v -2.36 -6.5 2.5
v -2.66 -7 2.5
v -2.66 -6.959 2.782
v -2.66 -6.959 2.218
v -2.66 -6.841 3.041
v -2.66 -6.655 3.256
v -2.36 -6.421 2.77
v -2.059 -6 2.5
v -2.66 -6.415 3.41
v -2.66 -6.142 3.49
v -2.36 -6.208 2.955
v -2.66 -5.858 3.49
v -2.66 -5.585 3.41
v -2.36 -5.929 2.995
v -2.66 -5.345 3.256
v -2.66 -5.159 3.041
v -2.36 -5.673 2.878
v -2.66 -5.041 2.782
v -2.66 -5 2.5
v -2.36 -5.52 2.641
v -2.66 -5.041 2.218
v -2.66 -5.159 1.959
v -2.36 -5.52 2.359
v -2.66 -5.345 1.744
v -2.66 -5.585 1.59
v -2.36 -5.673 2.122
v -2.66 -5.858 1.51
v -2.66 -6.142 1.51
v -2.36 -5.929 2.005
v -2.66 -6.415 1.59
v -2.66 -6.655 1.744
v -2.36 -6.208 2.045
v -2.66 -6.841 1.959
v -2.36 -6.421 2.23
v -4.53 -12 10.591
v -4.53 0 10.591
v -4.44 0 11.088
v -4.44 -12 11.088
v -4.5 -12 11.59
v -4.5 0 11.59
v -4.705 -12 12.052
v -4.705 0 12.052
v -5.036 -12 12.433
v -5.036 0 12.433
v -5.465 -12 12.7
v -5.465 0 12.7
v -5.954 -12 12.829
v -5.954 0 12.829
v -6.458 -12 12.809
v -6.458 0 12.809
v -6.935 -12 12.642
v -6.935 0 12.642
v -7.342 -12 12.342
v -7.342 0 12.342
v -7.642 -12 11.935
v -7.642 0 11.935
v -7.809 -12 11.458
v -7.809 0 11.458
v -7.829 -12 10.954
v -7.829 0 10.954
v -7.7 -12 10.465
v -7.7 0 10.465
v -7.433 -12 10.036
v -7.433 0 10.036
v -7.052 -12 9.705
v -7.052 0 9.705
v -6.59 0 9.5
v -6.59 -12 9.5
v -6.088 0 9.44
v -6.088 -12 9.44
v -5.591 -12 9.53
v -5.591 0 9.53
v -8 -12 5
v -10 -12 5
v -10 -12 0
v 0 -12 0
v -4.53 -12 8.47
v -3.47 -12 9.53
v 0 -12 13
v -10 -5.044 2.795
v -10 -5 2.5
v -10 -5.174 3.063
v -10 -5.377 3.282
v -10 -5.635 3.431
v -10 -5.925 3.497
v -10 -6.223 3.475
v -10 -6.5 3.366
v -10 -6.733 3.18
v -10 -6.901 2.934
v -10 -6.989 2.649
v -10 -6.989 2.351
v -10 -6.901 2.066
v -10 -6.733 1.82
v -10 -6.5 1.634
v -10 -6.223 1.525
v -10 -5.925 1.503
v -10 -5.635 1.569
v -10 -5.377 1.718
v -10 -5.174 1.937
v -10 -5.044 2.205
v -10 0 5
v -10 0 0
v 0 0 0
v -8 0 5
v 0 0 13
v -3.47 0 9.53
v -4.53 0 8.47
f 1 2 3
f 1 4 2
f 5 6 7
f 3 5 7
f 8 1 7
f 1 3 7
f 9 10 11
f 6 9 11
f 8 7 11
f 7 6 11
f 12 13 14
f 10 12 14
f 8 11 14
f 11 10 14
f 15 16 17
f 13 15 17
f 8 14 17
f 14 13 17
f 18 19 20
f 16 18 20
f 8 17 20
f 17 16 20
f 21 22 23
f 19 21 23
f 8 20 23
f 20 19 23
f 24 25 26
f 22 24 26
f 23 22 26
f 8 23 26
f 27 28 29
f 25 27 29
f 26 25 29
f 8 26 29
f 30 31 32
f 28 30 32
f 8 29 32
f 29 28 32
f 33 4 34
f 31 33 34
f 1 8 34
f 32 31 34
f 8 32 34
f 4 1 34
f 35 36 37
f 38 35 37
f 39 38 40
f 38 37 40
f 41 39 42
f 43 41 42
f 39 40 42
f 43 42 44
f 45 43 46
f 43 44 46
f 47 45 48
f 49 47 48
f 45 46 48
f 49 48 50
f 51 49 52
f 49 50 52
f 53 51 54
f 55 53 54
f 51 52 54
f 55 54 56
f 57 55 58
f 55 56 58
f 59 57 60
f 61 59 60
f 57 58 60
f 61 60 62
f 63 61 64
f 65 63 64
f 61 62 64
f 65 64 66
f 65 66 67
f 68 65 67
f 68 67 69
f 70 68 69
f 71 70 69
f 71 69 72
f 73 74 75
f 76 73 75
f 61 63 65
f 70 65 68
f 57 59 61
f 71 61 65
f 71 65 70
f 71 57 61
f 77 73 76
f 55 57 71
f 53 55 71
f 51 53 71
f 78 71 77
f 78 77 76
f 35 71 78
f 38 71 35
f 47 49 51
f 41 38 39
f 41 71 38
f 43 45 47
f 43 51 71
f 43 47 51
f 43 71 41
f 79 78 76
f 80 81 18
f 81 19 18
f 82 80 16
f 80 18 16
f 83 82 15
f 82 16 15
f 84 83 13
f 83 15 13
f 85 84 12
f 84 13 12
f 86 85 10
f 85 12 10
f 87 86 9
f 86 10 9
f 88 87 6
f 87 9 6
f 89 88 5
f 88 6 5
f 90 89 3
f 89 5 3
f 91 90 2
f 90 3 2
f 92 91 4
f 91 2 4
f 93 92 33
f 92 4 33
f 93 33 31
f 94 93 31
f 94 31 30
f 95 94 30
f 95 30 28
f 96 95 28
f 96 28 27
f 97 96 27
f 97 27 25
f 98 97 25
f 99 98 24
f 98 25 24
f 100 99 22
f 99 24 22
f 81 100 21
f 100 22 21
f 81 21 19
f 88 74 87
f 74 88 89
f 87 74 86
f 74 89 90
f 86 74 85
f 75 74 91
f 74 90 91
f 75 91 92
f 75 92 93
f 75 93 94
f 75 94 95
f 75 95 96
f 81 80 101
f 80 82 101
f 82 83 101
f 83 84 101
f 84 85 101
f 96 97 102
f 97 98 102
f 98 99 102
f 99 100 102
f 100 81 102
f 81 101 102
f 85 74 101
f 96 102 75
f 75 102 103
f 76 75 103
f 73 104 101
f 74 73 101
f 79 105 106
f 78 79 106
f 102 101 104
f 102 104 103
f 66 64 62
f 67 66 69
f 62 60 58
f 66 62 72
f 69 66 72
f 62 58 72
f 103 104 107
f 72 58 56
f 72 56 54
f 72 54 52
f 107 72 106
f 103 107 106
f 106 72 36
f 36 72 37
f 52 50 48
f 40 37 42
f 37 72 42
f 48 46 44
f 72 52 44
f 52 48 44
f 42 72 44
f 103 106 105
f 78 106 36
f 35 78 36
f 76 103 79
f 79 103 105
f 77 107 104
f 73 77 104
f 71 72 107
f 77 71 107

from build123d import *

# Parameters (mm, degrees)
F1_DEPTH = 12
F3_D     = 2
F3_DEPTH = 7.34
F3_TIP   = 0.600860619


with BuildPart() as f1:
    # F0 (on Front) → F1 (new body)
    with BuildSketch(Plane.XZ):
        with BuildLine():
            Line((-10, 0), (0, 0))
            Line((0, 0), (0, 13))
            Line((0, 13), (-3.4696699141, 9.5303300859))
            Line((-3.4696699141, 9.5303300859), (-4.5303300859, 10.5909902577))
            ThreePointArc((-4.5303300859, 10.5909902577), (-7.3415141503, 12.3415141503), (-5.5909902577, 9.5303300859))
            Line((-5.5909902577, 9.5303300859), (-4.5303300859, 8.4696699141))
            Line((-4.5303300859, 8.4696699141), (-8, 5))
            Line((-8, 5), (-10, 5))
            Line((-10, 5), (-10, 0))
        make_face()
    extrude(amount=F1_DEPTH)

    # F3
    with Locations(Plane(origin=(-10, 0, 0), x_dir=(0, -1, 0), z_dir=(-1, 0, 0))):
        with Locations((6, 2.5)):
            Hole(F3_D / 2, depth=F3_DEPTH)
            with Locations((0, 0, -(F3_DEPTH + F3_TIP / 2))):  # 118° drill point
                Cone(0, F3_D / 2, F3_TIP, mode=Mode.SUBTRACT)


solid = f1.part
